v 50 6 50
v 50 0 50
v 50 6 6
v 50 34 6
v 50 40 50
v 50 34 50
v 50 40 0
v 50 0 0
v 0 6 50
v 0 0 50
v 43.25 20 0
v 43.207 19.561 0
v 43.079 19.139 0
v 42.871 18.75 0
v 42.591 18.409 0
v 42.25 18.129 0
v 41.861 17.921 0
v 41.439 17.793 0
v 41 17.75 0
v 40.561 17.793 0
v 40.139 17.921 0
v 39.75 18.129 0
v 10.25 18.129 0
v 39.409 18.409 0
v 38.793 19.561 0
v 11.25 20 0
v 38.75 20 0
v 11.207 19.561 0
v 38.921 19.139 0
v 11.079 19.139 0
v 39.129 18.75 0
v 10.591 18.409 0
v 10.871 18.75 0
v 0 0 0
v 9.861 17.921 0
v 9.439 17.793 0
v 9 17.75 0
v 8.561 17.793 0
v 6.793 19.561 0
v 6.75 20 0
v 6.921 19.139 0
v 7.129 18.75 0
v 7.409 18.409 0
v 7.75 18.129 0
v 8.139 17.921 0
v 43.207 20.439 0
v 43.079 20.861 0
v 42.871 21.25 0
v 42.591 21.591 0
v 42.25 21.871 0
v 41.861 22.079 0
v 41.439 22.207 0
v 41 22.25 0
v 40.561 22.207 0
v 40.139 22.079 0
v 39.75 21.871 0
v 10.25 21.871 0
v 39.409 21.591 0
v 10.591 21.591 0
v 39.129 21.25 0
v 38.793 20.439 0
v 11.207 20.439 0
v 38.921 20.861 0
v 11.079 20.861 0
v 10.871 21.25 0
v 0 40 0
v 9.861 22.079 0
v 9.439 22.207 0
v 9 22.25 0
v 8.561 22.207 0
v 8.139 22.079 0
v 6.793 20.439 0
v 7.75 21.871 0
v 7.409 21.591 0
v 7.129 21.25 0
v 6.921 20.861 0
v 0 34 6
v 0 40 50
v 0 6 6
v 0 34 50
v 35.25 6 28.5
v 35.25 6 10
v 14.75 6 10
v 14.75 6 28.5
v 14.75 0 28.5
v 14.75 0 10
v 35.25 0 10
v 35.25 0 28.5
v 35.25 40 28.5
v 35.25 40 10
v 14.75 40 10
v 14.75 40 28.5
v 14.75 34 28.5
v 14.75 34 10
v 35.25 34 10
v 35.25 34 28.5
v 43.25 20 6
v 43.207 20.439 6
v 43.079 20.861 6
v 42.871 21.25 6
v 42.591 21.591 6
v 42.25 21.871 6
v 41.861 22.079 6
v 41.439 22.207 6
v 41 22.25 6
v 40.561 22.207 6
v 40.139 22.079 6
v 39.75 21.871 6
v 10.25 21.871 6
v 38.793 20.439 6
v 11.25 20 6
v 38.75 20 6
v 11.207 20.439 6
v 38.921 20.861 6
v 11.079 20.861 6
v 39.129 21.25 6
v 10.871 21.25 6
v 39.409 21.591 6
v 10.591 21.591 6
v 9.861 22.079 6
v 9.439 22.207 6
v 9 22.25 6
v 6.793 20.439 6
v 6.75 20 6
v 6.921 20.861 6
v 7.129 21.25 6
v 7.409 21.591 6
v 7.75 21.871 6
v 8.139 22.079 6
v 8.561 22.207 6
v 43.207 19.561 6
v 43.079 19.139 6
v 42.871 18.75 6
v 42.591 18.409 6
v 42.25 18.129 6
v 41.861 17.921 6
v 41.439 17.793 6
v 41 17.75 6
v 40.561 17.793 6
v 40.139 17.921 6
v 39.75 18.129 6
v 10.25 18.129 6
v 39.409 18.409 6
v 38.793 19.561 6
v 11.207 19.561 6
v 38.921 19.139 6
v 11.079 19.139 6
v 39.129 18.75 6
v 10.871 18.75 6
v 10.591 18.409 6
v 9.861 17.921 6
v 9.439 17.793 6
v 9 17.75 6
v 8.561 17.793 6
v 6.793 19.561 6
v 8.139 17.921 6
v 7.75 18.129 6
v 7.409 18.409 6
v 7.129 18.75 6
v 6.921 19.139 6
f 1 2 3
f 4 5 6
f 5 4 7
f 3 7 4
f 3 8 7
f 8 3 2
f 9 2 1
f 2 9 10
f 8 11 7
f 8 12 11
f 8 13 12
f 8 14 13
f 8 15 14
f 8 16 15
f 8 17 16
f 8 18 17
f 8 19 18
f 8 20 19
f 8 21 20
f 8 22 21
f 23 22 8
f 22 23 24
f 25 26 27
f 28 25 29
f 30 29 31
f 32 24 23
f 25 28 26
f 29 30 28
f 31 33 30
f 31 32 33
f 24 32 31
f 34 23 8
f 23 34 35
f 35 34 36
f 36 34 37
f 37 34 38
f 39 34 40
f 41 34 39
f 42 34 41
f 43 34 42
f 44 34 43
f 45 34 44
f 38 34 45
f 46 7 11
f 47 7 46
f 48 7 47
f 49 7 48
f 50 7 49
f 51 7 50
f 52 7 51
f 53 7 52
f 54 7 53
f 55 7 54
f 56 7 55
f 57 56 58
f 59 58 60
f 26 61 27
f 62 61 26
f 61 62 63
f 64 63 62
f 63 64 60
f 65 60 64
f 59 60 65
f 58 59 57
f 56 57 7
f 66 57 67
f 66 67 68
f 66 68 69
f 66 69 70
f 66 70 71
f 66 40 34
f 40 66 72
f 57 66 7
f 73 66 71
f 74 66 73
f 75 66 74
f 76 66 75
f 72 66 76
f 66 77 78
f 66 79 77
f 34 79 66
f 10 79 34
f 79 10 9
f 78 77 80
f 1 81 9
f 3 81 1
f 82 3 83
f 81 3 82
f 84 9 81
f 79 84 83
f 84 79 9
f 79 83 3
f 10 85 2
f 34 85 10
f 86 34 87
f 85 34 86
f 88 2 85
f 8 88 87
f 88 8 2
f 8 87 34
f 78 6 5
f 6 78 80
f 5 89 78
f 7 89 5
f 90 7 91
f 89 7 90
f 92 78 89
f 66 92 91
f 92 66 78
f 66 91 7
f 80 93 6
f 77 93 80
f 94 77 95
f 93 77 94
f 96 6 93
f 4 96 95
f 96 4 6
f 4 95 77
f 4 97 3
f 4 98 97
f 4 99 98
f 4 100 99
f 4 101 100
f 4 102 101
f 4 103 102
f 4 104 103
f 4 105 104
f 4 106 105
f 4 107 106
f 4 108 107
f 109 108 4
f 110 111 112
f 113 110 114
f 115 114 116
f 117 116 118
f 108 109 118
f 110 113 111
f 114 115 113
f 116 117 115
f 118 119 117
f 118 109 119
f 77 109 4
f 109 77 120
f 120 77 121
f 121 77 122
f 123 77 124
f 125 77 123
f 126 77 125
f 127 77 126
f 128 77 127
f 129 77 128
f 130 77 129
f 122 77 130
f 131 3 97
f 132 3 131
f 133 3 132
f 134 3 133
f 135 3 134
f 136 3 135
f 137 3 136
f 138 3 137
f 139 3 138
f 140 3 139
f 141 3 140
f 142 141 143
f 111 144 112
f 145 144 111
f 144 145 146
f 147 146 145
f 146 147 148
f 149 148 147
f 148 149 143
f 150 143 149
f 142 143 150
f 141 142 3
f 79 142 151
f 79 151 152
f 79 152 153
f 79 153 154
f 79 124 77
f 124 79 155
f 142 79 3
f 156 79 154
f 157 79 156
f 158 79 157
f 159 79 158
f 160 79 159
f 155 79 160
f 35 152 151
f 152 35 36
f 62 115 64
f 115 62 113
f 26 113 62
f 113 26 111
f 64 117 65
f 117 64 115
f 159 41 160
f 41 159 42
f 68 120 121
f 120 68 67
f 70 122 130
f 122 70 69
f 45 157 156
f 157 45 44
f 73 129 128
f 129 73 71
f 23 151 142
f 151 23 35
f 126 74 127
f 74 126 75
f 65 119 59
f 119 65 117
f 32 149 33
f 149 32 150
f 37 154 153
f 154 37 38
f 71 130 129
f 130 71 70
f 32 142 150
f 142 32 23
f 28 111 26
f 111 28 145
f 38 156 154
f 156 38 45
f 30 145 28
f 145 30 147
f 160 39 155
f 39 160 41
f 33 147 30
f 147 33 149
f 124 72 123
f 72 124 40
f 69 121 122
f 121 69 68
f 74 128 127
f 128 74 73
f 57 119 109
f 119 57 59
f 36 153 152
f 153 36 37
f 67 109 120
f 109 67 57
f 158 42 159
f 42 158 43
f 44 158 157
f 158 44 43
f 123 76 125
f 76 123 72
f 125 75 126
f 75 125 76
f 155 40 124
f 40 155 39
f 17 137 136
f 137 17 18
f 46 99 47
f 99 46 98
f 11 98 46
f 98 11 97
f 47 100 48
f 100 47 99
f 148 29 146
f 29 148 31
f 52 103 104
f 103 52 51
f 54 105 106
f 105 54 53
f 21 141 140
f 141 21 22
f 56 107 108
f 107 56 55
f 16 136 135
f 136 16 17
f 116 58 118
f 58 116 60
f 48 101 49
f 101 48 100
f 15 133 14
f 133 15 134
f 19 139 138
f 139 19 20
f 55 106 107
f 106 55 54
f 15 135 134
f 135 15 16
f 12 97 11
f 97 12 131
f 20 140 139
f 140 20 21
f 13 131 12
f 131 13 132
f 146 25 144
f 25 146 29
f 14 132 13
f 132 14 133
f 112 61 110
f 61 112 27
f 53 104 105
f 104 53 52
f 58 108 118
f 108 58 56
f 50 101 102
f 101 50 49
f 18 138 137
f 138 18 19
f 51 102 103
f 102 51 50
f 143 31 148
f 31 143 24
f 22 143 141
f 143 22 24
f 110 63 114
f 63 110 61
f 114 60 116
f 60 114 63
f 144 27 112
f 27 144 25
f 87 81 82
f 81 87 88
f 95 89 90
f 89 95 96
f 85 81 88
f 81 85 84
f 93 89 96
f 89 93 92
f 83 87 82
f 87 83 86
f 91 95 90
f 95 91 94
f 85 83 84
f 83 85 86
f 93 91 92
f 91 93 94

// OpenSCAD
$fn = 32;

// ----------------------------------------------------------------------
// U-bracket: 50 x 40 x 50 mm
// ----------------------------------------------------------------------

// --- parameters (mm) ---
rail_len = 50;            // outer length, X
jaw_w = 40;               // outer width, Y
jaw_h = 50;               // upright height, Z
web_t = 6;                // wall thickness
hole_d = 4.5;             // clearance for M4
window_l = 20.5;          // window length
window_h = 18.5;          // window height

module hole_z(px, py) {
  translate([px, py, -2.5]) cylinder(h = web_t + 5, d = hole_d);
}
module hole_y_pz(pz) {
  /* through both uprights along Y */
  translate([0, -2.5, pz]) rotate([-90, 0, 0]) cylinder(h = jaw_w + 5, d = hole_d);
}

module base() {
  cube([rail_len, jaw_w, web_t]);
}

module uprights() {
  cube([rail_len, web_t, jaw_h]);
  translate([0, jaw_w - web_t, 0]) cube([rail_len, web_t, jaw_h]);
}

difference() {
  union() {
    base();
    uprights();
  }
  hole_z(9, 20);
  hole_z(41, 20);
  /* lightening window through both uprights */
  translate([rail_len / 2 - window_l / 2, -1, web_t + 4])
    cube([window_l, jaw_w + 2, window_h]);
}
